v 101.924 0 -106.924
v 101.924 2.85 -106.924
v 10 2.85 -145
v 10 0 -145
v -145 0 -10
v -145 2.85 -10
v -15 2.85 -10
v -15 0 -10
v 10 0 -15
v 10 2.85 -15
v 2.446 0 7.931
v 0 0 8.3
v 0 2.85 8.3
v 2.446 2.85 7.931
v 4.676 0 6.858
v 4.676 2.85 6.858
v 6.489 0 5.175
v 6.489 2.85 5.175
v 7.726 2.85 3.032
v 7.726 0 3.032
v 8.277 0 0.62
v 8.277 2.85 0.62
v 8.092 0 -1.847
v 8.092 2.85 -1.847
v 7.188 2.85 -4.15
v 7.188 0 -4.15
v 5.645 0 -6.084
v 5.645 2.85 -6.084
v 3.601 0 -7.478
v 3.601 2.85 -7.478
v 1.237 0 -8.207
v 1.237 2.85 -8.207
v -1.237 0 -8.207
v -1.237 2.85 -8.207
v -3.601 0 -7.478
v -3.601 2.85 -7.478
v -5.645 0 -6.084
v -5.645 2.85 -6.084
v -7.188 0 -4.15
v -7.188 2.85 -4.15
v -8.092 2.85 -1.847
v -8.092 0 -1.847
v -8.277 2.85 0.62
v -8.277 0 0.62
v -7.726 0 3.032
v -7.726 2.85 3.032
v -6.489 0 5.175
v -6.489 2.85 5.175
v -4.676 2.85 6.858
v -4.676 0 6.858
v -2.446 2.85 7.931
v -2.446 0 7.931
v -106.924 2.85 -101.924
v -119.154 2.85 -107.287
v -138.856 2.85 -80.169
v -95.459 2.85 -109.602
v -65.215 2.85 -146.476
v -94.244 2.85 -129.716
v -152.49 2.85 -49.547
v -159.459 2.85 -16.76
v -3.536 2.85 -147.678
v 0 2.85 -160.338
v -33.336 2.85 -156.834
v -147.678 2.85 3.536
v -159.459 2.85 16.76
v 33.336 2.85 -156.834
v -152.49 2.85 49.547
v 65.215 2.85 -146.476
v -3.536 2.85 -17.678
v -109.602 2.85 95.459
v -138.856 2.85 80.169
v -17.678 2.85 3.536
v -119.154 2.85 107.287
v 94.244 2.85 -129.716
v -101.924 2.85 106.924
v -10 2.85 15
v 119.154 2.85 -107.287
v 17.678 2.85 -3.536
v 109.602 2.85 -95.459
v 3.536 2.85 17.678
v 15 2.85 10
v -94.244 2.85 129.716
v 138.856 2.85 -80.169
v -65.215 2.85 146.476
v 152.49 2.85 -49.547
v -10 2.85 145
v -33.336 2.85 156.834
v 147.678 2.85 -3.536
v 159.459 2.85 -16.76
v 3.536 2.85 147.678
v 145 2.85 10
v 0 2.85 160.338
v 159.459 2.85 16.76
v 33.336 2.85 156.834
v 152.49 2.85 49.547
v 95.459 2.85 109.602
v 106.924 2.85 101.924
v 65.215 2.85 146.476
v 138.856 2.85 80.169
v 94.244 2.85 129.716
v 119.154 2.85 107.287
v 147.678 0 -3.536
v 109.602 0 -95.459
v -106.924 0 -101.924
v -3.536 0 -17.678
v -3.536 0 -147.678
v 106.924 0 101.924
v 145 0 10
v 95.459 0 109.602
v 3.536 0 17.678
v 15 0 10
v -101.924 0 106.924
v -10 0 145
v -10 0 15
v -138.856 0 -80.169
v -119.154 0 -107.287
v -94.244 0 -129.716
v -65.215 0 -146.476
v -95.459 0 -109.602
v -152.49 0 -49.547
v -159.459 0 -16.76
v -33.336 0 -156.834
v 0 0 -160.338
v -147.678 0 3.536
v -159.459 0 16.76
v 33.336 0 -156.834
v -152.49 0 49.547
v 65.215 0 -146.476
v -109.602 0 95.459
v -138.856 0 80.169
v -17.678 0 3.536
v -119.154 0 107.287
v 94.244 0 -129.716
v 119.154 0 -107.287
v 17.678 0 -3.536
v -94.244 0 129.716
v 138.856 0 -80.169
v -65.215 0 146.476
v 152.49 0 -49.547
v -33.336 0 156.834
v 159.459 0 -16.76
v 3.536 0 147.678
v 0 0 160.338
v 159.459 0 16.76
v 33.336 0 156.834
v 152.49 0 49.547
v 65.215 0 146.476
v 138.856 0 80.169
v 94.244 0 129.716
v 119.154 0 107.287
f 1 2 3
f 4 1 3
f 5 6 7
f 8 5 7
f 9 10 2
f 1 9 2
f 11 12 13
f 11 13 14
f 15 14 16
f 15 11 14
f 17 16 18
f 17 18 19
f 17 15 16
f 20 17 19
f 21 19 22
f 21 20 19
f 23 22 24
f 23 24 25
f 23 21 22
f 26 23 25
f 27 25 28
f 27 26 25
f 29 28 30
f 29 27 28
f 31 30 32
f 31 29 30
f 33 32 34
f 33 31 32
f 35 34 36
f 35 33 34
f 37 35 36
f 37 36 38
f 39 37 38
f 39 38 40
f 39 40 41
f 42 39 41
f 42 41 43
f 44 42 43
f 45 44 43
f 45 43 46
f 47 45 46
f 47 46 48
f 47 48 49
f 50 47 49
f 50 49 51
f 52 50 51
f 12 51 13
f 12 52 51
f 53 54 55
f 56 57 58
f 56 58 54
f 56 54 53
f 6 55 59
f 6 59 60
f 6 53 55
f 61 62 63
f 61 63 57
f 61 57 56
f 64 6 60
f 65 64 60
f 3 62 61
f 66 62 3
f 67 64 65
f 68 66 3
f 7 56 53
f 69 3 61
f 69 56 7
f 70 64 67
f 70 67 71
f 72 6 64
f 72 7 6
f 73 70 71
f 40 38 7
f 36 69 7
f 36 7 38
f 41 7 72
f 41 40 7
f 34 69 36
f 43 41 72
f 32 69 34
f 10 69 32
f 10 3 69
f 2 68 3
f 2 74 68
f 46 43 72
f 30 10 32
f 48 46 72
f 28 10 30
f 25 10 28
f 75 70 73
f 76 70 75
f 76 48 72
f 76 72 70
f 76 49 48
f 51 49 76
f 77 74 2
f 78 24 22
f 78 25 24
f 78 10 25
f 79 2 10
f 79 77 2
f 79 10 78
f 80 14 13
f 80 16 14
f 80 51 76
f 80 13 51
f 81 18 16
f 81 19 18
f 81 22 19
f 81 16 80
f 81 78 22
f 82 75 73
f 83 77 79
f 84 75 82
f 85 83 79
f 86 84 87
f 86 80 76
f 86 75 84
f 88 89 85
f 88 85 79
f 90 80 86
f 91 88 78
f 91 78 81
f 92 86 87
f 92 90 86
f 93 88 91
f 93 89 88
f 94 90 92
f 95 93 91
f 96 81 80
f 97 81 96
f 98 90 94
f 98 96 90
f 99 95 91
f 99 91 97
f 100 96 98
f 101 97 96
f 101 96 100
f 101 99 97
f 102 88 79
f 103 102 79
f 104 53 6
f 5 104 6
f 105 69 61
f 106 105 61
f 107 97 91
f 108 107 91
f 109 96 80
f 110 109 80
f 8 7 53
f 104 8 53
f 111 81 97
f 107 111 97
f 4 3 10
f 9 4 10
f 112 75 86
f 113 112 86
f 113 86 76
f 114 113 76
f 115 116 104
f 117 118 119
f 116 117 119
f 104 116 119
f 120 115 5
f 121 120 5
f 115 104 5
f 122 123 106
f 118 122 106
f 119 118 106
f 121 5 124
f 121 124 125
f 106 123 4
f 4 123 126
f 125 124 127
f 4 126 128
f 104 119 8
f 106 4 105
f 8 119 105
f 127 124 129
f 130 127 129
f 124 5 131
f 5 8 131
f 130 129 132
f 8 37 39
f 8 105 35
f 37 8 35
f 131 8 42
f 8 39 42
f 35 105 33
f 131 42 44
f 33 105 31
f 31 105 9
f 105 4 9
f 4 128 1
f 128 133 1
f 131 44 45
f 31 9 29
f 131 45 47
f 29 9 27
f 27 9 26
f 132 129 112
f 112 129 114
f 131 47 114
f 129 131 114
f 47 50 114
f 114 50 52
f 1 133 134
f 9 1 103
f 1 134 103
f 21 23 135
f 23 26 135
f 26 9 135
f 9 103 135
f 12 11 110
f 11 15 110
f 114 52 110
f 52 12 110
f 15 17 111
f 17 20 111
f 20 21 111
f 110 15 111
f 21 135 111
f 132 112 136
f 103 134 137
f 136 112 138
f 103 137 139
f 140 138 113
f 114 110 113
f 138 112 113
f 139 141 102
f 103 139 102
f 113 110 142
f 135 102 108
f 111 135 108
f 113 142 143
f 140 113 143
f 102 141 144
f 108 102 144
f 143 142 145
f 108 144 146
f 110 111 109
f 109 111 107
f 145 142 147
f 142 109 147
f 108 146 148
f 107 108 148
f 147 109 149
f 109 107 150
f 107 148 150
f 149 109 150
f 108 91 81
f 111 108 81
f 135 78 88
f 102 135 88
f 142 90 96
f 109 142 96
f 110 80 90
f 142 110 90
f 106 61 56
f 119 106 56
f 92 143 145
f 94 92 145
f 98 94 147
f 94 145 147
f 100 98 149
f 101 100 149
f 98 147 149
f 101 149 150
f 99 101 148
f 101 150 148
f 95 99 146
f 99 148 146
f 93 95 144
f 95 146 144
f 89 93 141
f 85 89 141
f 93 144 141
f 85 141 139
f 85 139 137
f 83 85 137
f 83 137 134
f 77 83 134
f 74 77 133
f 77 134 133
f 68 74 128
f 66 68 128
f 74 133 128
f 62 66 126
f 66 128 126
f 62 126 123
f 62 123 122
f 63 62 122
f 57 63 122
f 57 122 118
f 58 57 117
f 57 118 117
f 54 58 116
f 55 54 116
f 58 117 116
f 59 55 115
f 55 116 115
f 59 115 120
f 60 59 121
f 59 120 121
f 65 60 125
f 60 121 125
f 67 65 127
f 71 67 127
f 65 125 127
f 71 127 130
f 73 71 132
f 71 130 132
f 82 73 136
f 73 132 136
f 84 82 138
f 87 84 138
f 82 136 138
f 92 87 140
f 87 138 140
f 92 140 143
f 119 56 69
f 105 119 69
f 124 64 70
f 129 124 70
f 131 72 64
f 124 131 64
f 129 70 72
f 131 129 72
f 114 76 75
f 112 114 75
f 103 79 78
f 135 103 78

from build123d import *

# Parameters (mm, degrees)
SKETCH1_R           = 160.3375
SKETCH1_R_2         = 8.3
BOSS_EXTRUDE1_DEPTH = 2.85
CUT_EXTRUDE1_DEPTH  = 227.769376928


with BuildPart() as part:
    # Sketch1 → Boss-Extrude1 (new body)
    with BuildSketch(Plane(origin=(0, 0, 0), x_dir=(1, 0, 0), z_dir=(0, 1, 0))):
        with Locations(Location((0, 0, 0), (0, 0, 270))):
            Circle(SKETCH1_R)
        with Locations(Location((0, 0, 0), (0, 0, 270))):
            Circle(SKETCH1_R_2, mode=Mode.SUBTRACT)
    extrude(amount=BOSS_EXTRUDE1_DEPTH)

    # Sketch3 → Cut-Extrude1 (cut, through all)
    with BuildSketch(Plane(origin=(0, 2.85, 0), x_dir=(1, 0, 0), z_dir=(0, 1, 0))):
        Polygon((-15, 10), (-106.923881554, 101.923881554), (-145, 10), align=None)
        Polygon((-95.45941546, 109.601551084), (-3.535533906, 17.67766953), (-3.535533906, 147.67766953), align=None)
        Polygon((10, 145), (10, 15), (101.923881554, 106.923881554), align=None)
        Polygon((109.601551084, 95.45941546), (17.67766953, 3.535533906), (147.67766953, 3.535533906), align=None)
        Polygon((145, -10), (15, -10), (106.923881554, -101.923881554), align=None)
        Polygon((95.45941546, -109.601551084), (3.535533906, -17.67766953), (3.535533906, -147.67766953), align=None)
        Polygon((-10, -145), (-10, -15), (-101.923881554, -106.923881554), align=None)
        Polygon((-109.601551084, -95.45941546), (-17.67766953, -3.535533906), (-147.67766953, -3.535533906), align=None)
    extrude(amount=-CUT_EXTRUDE1_DEPTH, mode=Mode.SUBTRACT)


solid = part.part
